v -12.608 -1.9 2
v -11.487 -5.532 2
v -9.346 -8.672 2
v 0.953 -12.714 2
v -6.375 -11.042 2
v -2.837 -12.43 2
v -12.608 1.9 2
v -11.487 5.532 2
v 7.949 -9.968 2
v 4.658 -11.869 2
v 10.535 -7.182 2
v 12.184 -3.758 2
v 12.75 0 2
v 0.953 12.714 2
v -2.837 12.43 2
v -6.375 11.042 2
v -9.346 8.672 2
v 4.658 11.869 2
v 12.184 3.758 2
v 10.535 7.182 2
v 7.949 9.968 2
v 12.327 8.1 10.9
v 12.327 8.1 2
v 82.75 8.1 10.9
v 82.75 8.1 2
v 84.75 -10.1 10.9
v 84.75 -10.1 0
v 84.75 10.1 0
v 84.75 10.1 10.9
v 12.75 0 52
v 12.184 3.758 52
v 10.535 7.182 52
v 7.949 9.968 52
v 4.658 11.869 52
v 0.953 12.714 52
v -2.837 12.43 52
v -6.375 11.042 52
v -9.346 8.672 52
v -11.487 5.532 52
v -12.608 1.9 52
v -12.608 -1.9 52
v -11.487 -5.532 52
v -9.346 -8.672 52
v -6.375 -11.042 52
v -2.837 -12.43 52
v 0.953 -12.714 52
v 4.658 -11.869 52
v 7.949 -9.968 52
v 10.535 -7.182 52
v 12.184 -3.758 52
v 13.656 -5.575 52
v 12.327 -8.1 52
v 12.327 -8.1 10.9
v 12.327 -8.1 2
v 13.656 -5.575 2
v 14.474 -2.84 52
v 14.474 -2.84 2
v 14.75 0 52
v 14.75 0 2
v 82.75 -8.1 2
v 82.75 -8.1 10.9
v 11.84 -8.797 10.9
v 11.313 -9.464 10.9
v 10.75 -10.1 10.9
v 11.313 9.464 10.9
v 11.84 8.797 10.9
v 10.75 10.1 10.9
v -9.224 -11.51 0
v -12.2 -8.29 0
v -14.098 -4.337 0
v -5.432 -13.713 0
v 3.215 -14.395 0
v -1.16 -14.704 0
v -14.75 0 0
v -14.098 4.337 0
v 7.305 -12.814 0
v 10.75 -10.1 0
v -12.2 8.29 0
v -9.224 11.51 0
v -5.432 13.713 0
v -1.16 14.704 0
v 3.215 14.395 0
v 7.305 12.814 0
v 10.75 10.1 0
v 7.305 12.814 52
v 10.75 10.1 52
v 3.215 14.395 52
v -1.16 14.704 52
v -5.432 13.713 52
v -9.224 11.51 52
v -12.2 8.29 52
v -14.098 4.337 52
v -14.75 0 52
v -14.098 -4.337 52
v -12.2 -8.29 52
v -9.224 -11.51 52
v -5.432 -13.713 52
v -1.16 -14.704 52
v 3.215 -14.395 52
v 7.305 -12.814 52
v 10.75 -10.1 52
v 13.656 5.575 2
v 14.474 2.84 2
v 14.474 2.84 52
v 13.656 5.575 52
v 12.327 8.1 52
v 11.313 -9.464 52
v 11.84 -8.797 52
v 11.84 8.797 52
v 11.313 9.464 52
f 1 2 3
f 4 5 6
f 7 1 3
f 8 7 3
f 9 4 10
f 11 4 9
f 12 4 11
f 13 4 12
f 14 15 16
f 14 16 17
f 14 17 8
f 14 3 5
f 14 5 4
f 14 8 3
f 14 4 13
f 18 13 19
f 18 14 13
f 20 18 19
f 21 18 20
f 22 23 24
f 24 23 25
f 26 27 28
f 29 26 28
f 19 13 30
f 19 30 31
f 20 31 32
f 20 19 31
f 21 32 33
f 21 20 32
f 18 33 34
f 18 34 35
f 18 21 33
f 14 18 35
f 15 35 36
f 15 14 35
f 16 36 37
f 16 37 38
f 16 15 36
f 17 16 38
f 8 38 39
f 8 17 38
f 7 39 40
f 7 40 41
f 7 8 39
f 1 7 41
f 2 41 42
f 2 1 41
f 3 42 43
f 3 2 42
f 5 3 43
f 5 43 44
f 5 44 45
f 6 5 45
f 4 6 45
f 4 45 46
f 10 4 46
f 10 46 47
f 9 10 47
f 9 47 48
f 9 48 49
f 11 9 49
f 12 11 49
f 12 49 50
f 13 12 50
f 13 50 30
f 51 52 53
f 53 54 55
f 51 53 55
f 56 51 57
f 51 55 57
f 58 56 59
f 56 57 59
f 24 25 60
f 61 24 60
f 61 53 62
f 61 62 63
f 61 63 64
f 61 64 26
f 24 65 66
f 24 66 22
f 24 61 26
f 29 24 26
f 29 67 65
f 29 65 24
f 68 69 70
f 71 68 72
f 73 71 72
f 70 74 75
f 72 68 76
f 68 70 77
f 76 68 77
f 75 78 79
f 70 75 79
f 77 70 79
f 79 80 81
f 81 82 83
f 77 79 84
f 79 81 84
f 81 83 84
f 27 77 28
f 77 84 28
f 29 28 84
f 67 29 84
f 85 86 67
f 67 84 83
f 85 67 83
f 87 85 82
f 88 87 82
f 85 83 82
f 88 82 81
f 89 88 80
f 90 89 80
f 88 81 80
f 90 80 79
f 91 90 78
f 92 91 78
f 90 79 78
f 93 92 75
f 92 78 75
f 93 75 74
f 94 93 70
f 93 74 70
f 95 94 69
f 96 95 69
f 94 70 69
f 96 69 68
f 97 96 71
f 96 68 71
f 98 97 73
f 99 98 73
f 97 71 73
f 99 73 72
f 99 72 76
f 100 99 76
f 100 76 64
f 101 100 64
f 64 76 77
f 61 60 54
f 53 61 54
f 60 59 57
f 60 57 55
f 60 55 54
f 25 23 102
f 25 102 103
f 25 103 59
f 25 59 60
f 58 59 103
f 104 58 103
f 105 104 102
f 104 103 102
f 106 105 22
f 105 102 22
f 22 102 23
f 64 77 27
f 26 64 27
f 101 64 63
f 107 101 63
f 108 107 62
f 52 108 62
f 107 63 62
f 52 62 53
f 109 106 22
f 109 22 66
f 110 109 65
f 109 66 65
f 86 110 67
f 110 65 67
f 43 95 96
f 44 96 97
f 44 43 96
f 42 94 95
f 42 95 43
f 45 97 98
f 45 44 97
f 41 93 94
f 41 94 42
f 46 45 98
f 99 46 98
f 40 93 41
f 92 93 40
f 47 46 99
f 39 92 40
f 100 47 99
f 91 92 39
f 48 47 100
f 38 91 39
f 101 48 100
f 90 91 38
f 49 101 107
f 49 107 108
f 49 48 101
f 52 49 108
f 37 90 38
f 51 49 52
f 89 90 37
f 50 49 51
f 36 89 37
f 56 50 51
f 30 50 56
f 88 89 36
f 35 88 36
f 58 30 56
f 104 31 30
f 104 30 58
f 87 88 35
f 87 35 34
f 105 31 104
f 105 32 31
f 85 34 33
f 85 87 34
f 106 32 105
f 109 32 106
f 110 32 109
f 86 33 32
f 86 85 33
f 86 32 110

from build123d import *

# Parameters (mm, degrees)
F1_DEPTH = 10.9
F0_R     = 12.75
F2_DEPTH = 52
F3_DEPTH = 2
F4_DEPTH = 2


with BuildPart() as f1:
    # F0 (on Top) → F1 (new body)
    with BuildSketch(Plane.XY):
        with BuildLine():
            ThreePointArc((10.749535, 10.1), (11.581471, 9.134113), (12.326901, 8.1))
            Line((12.326901, 8.1), (82.75, 8.1))
            Line((82.75, 8.1), (82.75, 10.1))
            Line((82.75, 10.1), (10.749535, 10.1))
        make_face()
        Polygon((82.75, 8.1), (82.75, 0), (82.75, -8.1), (82.75, -10.1), (84.75, -10.1), (84.75, 10.1), (82.75, 10.1), align=None)
        with BuildLine():
            Line((82.75, -8.1), (12.326901, -8.1))
            ThreePointArc((12.326901, -8.1), (11.581471, -9.134113), (10.749535, -10.1))
            Line((10.749535, -10.1), (82.75, -10.1))
            Line((82.75, -10.1), (82.75, -8.1))
        make_face()
    extrude(amount=F1_DEPTH)

    # F0 (on Top) → F2 (join)
    with BuildSketch(Plane.XY):
        with BuildLine():
            ThreePointArc((12.326901, -8.1), (14.131247, -4.227334), (14.75, 0))
            ThreePointArc((14.75, 0), (14.131247, 4.227334), (12.326901, 8.1))
            ThreePointArc((12.326901, 8.1), (11.581471, 9.134113), (10.749535, 10.1))
            ThreePointArc((10.749535, 10.1), (-14.75, 0), (10.749535, -10.1))
            ThreePointArc((10.749535, -10.1), (11.581471, -9.134113), (12.326901, -8.1))
        make_face()
        Circle(F0_R, mode=Mode.SUBTRACT)
    extrude(amount=F2_DEPTH)

    # F0 (on Top) → F3 (join)
    with BuildSketch(Plane.XY):
        with BuildLine():
            ThreePointArc((12.326901, 8.1), (14.131247, 4.227334), (14.75, 0))
            Line((14.75, 0), (82.75, 0))
            Line((82.75, 0), (82.75, 8.1))
            Line((82.75, 8.1), (12.326901, 8.1))
        make_face()
        with BuildLine():
            Line((82.75, 0), (14.75, 0))
            ThreePointArc((14.75, 0), (14.131247, -4.227334), (12.326901, -8.1))
            Line((12.326901, -8.1), (82.75, -8.1))
            Line((82.75, -8.1), (82.75, 0))
        make_face()
    extrude(amount=F3_DEPTH)

    # F0 (on Top) → F4 (join)
    with BuildSketch(Plane.XY):
        Circle(F0_R)
    extrude(amount=F4_DEPTH)


solid = f1.part
